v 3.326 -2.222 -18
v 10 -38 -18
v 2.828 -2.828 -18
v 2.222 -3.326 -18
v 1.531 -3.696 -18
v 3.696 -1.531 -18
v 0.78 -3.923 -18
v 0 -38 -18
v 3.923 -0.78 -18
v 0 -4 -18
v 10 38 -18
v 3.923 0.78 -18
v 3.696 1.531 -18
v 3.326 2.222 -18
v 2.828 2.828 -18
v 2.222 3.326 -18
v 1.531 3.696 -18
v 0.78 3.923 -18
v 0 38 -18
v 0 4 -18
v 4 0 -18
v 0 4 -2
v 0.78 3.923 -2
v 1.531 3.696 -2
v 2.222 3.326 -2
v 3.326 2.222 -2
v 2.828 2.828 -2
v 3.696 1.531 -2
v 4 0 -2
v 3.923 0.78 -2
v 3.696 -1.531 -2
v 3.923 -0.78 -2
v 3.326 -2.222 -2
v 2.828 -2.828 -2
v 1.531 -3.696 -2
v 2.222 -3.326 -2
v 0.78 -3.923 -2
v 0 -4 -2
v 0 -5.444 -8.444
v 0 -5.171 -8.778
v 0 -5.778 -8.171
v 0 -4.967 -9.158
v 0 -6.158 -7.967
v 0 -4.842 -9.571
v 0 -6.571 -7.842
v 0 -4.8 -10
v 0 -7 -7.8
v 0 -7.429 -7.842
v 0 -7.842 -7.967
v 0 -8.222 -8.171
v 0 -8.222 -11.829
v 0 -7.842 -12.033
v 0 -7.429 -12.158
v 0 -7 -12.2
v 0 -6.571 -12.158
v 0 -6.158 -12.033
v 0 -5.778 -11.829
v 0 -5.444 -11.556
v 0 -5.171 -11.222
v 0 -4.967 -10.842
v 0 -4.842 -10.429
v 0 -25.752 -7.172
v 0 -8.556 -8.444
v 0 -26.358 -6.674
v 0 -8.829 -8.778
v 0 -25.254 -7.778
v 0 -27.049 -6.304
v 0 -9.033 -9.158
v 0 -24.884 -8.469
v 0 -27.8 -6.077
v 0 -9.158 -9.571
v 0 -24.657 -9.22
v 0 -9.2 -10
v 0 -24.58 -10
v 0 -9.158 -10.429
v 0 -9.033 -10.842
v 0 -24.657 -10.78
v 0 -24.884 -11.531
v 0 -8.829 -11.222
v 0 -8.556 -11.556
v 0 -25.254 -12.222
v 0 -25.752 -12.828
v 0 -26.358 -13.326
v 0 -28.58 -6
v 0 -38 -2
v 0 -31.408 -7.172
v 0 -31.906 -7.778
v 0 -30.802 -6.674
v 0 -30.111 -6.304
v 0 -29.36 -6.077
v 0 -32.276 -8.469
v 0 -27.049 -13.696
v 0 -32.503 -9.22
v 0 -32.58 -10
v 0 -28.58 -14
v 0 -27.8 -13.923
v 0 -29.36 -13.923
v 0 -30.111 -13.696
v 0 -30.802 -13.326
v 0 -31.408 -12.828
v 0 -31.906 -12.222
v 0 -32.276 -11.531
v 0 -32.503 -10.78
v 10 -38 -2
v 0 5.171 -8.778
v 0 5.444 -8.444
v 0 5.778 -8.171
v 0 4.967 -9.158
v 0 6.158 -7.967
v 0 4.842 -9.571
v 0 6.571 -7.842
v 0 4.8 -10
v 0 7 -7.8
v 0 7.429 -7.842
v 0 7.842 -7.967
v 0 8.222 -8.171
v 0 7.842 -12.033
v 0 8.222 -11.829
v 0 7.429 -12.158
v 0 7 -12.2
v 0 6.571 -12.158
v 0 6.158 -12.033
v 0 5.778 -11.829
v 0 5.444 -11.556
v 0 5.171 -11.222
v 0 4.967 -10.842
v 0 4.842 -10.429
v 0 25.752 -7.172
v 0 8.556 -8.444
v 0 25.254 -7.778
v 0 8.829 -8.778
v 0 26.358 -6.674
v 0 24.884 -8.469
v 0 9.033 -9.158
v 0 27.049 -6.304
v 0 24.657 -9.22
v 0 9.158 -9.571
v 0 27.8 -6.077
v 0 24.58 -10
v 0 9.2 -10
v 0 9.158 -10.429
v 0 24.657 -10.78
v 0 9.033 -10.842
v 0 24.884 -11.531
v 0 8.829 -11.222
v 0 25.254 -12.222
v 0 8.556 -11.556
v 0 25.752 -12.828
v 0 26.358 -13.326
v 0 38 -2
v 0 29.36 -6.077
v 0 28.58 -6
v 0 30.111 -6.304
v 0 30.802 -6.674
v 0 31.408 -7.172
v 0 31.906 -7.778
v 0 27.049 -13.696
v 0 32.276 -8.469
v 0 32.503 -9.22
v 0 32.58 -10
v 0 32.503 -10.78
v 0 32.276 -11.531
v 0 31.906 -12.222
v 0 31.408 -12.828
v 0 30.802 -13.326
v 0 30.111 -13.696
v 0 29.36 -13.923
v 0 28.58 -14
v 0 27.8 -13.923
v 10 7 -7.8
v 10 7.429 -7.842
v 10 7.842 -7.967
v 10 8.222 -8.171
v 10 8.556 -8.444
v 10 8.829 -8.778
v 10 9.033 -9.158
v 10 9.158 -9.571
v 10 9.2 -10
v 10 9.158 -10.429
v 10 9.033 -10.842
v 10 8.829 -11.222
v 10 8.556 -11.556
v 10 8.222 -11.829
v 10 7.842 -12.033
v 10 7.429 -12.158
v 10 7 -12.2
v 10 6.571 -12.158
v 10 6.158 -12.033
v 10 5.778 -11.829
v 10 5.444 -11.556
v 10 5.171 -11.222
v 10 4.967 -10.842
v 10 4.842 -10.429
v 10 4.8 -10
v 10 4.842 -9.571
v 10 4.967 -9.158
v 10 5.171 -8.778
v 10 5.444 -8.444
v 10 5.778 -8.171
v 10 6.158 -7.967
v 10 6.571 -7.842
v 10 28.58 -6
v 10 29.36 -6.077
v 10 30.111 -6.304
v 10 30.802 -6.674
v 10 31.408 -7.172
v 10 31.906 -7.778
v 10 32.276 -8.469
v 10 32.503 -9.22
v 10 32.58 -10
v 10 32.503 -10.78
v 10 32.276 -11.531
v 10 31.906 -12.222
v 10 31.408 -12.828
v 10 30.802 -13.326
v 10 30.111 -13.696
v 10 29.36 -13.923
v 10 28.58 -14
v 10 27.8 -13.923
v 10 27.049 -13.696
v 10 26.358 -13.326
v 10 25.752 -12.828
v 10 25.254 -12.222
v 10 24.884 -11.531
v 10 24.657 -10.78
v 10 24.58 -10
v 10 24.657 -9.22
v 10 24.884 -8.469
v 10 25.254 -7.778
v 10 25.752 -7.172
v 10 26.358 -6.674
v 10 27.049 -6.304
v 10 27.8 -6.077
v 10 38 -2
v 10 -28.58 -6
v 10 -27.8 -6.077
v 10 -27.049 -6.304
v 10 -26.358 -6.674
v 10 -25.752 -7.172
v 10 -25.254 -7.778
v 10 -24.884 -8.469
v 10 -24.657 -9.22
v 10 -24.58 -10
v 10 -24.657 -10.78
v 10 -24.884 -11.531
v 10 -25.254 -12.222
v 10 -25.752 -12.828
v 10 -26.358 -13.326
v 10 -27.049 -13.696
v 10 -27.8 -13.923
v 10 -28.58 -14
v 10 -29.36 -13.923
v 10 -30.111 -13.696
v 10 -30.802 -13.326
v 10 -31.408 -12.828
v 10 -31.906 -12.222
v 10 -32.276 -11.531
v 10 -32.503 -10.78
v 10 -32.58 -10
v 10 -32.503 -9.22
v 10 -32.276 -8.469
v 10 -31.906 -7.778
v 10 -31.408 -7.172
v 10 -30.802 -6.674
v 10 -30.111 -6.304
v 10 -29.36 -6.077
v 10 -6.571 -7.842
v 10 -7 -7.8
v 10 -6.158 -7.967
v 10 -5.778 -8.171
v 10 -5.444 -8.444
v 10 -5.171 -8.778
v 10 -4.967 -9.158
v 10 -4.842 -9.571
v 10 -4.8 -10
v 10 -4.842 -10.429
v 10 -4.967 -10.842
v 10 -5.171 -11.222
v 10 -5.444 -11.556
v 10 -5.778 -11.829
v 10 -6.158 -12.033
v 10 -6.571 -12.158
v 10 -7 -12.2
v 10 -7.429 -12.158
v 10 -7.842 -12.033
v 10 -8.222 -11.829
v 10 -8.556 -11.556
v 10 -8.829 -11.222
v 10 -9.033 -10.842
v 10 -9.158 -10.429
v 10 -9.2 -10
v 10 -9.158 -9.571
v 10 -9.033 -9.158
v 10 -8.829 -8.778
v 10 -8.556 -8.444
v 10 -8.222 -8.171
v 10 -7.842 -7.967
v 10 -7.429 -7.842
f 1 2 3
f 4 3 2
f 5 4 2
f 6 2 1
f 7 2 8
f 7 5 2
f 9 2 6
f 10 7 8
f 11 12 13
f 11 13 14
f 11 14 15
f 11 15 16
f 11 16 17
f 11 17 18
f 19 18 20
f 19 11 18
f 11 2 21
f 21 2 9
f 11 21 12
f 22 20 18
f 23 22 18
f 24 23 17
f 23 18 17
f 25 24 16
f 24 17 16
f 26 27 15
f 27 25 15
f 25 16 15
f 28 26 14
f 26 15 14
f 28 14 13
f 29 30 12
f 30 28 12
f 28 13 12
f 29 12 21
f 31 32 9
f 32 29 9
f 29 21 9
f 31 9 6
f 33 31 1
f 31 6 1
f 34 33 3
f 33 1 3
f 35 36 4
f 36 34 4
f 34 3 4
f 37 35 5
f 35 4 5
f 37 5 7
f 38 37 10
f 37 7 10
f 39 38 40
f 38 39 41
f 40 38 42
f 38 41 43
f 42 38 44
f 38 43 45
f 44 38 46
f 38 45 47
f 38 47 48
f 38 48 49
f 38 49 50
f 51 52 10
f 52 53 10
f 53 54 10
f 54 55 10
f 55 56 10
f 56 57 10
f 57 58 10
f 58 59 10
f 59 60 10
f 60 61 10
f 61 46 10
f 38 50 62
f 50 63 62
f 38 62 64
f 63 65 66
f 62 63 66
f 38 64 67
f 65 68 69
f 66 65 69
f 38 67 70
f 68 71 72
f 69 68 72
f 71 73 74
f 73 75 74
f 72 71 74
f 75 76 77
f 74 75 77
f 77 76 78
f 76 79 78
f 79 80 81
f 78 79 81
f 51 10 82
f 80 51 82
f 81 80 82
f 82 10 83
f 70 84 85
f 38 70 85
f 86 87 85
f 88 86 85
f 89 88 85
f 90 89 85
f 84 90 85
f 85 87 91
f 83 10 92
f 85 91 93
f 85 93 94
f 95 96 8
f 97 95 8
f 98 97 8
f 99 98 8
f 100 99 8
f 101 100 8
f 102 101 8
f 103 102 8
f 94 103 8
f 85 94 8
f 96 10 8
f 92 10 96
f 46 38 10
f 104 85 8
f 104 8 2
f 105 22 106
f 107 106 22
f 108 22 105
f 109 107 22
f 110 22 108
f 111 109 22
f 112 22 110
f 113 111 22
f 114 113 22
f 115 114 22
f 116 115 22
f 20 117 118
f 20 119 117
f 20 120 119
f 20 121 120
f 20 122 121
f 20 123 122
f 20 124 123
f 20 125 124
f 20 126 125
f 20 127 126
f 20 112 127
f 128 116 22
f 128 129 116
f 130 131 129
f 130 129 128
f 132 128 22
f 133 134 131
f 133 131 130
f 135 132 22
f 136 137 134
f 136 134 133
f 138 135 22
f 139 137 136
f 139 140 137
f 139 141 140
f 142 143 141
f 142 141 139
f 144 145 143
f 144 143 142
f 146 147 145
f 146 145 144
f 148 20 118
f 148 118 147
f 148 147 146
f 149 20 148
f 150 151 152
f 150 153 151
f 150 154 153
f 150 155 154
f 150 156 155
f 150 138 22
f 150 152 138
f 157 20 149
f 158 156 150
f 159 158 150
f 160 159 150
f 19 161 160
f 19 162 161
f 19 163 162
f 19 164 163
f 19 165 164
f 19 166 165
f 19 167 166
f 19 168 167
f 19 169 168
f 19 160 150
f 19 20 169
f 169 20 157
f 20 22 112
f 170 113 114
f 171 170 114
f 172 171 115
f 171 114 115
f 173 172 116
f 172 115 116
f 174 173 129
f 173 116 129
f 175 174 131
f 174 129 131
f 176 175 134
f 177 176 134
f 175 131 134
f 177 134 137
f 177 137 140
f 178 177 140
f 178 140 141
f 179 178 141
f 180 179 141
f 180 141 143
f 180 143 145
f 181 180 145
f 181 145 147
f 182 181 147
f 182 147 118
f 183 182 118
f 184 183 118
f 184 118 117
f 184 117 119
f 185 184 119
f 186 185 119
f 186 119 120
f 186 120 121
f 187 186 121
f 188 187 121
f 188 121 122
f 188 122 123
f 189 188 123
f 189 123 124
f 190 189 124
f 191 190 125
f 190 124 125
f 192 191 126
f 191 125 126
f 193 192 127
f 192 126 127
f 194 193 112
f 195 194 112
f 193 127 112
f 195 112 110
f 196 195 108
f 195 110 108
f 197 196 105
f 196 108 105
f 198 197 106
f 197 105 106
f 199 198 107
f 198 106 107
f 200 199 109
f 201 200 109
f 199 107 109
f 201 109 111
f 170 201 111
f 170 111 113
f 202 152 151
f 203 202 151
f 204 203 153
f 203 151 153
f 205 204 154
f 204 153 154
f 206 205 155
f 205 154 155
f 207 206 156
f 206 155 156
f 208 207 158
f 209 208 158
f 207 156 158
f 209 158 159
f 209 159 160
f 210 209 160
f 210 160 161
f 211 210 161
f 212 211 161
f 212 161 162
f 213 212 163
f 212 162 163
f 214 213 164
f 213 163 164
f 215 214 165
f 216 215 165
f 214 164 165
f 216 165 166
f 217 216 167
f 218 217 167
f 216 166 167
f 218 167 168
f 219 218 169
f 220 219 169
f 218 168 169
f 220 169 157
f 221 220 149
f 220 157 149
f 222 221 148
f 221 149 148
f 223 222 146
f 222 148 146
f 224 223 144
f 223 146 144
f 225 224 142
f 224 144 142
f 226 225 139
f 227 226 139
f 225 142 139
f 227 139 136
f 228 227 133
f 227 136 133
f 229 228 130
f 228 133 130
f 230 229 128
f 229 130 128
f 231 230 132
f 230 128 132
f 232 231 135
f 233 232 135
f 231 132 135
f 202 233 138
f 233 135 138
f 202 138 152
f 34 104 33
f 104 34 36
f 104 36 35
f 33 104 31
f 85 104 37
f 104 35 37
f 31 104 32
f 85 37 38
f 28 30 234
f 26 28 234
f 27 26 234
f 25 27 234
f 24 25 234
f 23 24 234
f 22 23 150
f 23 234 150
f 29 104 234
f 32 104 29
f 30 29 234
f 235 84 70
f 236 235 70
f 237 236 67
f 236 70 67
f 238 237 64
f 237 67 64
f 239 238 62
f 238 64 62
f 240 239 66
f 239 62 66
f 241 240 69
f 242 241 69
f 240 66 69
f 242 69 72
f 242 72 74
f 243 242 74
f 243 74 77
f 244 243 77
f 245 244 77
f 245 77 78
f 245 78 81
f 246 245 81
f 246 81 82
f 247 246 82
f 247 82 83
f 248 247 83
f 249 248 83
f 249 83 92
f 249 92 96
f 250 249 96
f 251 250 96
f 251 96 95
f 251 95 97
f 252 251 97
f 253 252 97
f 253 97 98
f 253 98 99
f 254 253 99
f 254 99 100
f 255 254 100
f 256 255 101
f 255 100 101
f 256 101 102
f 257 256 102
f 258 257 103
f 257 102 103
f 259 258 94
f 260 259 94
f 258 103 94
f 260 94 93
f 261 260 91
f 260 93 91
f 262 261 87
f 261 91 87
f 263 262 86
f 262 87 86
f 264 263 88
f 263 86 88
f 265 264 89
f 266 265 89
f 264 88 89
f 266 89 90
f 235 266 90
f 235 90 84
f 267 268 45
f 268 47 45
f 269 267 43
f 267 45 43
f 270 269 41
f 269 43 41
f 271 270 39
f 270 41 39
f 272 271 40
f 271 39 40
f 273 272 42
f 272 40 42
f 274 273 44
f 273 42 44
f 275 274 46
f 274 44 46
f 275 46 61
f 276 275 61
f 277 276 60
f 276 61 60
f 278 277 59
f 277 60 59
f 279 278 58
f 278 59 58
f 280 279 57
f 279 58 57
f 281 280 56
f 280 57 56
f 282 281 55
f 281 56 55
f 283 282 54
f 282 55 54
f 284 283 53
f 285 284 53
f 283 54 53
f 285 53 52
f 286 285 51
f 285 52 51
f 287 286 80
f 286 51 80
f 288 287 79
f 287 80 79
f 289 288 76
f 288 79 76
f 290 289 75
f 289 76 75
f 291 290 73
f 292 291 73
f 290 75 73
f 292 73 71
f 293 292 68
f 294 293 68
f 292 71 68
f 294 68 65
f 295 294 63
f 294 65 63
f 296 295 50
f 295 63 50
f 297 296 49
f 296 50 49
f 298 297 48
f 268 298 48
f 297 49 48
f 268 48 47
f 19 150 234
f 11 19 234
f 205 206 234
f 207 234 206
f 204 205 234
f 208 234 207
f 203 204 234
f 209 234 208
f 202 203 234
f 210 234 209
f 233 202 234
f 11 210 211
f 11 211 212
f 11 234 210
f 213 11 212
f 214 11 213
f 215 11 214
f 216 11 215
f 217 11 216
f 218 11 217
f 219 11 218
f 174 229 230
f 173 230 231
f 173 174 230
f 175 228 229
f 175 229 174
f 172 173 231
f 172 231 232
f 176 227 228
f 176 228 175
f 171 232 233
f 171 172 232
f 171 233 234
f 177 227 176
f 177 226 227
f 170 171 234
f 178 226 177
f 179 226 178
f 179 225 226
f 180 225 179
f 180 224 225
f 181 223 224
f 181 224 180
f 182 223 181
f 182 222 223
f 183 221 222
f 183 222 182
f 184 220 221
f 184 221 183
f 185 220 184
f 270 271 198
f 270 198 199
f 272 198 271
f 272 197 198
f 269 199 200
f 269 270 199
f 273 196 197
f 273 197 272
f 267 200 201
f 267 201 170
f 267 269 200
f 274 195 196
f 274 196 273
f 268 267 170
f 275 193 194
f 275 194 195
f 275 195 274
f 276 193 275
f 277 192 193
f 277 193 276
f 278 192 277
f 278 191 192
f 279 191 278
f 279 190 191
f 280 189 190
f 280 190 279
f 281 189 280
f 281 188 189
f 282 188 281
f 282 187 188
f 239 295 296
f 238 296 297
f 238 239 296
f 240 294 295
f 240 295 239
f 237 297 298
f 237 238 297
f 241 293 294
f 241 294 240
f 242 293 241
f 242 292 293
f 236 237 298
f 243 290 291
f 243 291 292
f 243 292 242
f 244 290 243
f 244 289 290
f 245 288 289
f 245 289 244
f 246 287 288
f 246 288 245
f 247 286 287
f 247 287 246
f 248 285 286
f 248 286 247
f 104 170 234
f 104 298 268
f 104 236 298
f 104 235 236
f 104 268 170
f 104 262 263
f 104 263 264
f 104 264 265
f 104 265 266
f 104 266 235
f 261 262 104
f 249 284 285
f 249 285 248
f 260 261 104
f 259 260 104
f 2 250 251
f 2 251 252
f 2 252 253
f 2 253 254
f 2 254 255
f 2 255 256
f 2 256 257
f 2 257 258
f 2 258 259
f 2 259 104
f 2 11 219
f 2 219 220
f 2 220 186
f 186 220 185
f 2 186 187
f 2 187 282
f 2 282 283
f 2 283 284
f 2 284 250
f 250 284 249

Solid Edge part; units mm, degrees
sketch "Sketch1" plane through (0, 0, -10) normal (0, 0, 1) x (1, 0, 0)
  line L0 (0, 4) -> (0, 38)
  line L1 (0, 38) -> (10, 38)
  line L2 (10, 38) -> (10, 0)
  line L3 (10, -38) -> (10, 0)
  line L4 (0, -38) -> (10, -38)
  line L5 (0, -4) -> (0, -38)
  arc A0 (0, -4) -> (0, 4) centre (0, 0) ccw
extrude "ExtrudedProtrusion_1" add sketch "Sketch1" along normal mid plane 16
sketch "Sketch2" plane through (0, 21, -10) normal (-1, 0, 0) x (0, 0, 1)
  circle A0 centre (0, 7.58) radius 4
  circle A1 centre (0, -49.58) radius 4
extrude "Cutout1" cut sketch "Sketch2" against normal through all
sketch "Sketch3" plane through (0, 21, -10) normal (-1, 0, 0) x (0, 0, 1)
  circle A0 centre (0, -14) radius 2.2
  dimension "D1" = 3
  dimension "D2" = 4.4
extrude "Cutout2" cut sketch "Sketch3" against normal through all
mirror "Mirror1" about plane through (0, 0, 0) normal (0, -1, 0) of "Cutout2"
